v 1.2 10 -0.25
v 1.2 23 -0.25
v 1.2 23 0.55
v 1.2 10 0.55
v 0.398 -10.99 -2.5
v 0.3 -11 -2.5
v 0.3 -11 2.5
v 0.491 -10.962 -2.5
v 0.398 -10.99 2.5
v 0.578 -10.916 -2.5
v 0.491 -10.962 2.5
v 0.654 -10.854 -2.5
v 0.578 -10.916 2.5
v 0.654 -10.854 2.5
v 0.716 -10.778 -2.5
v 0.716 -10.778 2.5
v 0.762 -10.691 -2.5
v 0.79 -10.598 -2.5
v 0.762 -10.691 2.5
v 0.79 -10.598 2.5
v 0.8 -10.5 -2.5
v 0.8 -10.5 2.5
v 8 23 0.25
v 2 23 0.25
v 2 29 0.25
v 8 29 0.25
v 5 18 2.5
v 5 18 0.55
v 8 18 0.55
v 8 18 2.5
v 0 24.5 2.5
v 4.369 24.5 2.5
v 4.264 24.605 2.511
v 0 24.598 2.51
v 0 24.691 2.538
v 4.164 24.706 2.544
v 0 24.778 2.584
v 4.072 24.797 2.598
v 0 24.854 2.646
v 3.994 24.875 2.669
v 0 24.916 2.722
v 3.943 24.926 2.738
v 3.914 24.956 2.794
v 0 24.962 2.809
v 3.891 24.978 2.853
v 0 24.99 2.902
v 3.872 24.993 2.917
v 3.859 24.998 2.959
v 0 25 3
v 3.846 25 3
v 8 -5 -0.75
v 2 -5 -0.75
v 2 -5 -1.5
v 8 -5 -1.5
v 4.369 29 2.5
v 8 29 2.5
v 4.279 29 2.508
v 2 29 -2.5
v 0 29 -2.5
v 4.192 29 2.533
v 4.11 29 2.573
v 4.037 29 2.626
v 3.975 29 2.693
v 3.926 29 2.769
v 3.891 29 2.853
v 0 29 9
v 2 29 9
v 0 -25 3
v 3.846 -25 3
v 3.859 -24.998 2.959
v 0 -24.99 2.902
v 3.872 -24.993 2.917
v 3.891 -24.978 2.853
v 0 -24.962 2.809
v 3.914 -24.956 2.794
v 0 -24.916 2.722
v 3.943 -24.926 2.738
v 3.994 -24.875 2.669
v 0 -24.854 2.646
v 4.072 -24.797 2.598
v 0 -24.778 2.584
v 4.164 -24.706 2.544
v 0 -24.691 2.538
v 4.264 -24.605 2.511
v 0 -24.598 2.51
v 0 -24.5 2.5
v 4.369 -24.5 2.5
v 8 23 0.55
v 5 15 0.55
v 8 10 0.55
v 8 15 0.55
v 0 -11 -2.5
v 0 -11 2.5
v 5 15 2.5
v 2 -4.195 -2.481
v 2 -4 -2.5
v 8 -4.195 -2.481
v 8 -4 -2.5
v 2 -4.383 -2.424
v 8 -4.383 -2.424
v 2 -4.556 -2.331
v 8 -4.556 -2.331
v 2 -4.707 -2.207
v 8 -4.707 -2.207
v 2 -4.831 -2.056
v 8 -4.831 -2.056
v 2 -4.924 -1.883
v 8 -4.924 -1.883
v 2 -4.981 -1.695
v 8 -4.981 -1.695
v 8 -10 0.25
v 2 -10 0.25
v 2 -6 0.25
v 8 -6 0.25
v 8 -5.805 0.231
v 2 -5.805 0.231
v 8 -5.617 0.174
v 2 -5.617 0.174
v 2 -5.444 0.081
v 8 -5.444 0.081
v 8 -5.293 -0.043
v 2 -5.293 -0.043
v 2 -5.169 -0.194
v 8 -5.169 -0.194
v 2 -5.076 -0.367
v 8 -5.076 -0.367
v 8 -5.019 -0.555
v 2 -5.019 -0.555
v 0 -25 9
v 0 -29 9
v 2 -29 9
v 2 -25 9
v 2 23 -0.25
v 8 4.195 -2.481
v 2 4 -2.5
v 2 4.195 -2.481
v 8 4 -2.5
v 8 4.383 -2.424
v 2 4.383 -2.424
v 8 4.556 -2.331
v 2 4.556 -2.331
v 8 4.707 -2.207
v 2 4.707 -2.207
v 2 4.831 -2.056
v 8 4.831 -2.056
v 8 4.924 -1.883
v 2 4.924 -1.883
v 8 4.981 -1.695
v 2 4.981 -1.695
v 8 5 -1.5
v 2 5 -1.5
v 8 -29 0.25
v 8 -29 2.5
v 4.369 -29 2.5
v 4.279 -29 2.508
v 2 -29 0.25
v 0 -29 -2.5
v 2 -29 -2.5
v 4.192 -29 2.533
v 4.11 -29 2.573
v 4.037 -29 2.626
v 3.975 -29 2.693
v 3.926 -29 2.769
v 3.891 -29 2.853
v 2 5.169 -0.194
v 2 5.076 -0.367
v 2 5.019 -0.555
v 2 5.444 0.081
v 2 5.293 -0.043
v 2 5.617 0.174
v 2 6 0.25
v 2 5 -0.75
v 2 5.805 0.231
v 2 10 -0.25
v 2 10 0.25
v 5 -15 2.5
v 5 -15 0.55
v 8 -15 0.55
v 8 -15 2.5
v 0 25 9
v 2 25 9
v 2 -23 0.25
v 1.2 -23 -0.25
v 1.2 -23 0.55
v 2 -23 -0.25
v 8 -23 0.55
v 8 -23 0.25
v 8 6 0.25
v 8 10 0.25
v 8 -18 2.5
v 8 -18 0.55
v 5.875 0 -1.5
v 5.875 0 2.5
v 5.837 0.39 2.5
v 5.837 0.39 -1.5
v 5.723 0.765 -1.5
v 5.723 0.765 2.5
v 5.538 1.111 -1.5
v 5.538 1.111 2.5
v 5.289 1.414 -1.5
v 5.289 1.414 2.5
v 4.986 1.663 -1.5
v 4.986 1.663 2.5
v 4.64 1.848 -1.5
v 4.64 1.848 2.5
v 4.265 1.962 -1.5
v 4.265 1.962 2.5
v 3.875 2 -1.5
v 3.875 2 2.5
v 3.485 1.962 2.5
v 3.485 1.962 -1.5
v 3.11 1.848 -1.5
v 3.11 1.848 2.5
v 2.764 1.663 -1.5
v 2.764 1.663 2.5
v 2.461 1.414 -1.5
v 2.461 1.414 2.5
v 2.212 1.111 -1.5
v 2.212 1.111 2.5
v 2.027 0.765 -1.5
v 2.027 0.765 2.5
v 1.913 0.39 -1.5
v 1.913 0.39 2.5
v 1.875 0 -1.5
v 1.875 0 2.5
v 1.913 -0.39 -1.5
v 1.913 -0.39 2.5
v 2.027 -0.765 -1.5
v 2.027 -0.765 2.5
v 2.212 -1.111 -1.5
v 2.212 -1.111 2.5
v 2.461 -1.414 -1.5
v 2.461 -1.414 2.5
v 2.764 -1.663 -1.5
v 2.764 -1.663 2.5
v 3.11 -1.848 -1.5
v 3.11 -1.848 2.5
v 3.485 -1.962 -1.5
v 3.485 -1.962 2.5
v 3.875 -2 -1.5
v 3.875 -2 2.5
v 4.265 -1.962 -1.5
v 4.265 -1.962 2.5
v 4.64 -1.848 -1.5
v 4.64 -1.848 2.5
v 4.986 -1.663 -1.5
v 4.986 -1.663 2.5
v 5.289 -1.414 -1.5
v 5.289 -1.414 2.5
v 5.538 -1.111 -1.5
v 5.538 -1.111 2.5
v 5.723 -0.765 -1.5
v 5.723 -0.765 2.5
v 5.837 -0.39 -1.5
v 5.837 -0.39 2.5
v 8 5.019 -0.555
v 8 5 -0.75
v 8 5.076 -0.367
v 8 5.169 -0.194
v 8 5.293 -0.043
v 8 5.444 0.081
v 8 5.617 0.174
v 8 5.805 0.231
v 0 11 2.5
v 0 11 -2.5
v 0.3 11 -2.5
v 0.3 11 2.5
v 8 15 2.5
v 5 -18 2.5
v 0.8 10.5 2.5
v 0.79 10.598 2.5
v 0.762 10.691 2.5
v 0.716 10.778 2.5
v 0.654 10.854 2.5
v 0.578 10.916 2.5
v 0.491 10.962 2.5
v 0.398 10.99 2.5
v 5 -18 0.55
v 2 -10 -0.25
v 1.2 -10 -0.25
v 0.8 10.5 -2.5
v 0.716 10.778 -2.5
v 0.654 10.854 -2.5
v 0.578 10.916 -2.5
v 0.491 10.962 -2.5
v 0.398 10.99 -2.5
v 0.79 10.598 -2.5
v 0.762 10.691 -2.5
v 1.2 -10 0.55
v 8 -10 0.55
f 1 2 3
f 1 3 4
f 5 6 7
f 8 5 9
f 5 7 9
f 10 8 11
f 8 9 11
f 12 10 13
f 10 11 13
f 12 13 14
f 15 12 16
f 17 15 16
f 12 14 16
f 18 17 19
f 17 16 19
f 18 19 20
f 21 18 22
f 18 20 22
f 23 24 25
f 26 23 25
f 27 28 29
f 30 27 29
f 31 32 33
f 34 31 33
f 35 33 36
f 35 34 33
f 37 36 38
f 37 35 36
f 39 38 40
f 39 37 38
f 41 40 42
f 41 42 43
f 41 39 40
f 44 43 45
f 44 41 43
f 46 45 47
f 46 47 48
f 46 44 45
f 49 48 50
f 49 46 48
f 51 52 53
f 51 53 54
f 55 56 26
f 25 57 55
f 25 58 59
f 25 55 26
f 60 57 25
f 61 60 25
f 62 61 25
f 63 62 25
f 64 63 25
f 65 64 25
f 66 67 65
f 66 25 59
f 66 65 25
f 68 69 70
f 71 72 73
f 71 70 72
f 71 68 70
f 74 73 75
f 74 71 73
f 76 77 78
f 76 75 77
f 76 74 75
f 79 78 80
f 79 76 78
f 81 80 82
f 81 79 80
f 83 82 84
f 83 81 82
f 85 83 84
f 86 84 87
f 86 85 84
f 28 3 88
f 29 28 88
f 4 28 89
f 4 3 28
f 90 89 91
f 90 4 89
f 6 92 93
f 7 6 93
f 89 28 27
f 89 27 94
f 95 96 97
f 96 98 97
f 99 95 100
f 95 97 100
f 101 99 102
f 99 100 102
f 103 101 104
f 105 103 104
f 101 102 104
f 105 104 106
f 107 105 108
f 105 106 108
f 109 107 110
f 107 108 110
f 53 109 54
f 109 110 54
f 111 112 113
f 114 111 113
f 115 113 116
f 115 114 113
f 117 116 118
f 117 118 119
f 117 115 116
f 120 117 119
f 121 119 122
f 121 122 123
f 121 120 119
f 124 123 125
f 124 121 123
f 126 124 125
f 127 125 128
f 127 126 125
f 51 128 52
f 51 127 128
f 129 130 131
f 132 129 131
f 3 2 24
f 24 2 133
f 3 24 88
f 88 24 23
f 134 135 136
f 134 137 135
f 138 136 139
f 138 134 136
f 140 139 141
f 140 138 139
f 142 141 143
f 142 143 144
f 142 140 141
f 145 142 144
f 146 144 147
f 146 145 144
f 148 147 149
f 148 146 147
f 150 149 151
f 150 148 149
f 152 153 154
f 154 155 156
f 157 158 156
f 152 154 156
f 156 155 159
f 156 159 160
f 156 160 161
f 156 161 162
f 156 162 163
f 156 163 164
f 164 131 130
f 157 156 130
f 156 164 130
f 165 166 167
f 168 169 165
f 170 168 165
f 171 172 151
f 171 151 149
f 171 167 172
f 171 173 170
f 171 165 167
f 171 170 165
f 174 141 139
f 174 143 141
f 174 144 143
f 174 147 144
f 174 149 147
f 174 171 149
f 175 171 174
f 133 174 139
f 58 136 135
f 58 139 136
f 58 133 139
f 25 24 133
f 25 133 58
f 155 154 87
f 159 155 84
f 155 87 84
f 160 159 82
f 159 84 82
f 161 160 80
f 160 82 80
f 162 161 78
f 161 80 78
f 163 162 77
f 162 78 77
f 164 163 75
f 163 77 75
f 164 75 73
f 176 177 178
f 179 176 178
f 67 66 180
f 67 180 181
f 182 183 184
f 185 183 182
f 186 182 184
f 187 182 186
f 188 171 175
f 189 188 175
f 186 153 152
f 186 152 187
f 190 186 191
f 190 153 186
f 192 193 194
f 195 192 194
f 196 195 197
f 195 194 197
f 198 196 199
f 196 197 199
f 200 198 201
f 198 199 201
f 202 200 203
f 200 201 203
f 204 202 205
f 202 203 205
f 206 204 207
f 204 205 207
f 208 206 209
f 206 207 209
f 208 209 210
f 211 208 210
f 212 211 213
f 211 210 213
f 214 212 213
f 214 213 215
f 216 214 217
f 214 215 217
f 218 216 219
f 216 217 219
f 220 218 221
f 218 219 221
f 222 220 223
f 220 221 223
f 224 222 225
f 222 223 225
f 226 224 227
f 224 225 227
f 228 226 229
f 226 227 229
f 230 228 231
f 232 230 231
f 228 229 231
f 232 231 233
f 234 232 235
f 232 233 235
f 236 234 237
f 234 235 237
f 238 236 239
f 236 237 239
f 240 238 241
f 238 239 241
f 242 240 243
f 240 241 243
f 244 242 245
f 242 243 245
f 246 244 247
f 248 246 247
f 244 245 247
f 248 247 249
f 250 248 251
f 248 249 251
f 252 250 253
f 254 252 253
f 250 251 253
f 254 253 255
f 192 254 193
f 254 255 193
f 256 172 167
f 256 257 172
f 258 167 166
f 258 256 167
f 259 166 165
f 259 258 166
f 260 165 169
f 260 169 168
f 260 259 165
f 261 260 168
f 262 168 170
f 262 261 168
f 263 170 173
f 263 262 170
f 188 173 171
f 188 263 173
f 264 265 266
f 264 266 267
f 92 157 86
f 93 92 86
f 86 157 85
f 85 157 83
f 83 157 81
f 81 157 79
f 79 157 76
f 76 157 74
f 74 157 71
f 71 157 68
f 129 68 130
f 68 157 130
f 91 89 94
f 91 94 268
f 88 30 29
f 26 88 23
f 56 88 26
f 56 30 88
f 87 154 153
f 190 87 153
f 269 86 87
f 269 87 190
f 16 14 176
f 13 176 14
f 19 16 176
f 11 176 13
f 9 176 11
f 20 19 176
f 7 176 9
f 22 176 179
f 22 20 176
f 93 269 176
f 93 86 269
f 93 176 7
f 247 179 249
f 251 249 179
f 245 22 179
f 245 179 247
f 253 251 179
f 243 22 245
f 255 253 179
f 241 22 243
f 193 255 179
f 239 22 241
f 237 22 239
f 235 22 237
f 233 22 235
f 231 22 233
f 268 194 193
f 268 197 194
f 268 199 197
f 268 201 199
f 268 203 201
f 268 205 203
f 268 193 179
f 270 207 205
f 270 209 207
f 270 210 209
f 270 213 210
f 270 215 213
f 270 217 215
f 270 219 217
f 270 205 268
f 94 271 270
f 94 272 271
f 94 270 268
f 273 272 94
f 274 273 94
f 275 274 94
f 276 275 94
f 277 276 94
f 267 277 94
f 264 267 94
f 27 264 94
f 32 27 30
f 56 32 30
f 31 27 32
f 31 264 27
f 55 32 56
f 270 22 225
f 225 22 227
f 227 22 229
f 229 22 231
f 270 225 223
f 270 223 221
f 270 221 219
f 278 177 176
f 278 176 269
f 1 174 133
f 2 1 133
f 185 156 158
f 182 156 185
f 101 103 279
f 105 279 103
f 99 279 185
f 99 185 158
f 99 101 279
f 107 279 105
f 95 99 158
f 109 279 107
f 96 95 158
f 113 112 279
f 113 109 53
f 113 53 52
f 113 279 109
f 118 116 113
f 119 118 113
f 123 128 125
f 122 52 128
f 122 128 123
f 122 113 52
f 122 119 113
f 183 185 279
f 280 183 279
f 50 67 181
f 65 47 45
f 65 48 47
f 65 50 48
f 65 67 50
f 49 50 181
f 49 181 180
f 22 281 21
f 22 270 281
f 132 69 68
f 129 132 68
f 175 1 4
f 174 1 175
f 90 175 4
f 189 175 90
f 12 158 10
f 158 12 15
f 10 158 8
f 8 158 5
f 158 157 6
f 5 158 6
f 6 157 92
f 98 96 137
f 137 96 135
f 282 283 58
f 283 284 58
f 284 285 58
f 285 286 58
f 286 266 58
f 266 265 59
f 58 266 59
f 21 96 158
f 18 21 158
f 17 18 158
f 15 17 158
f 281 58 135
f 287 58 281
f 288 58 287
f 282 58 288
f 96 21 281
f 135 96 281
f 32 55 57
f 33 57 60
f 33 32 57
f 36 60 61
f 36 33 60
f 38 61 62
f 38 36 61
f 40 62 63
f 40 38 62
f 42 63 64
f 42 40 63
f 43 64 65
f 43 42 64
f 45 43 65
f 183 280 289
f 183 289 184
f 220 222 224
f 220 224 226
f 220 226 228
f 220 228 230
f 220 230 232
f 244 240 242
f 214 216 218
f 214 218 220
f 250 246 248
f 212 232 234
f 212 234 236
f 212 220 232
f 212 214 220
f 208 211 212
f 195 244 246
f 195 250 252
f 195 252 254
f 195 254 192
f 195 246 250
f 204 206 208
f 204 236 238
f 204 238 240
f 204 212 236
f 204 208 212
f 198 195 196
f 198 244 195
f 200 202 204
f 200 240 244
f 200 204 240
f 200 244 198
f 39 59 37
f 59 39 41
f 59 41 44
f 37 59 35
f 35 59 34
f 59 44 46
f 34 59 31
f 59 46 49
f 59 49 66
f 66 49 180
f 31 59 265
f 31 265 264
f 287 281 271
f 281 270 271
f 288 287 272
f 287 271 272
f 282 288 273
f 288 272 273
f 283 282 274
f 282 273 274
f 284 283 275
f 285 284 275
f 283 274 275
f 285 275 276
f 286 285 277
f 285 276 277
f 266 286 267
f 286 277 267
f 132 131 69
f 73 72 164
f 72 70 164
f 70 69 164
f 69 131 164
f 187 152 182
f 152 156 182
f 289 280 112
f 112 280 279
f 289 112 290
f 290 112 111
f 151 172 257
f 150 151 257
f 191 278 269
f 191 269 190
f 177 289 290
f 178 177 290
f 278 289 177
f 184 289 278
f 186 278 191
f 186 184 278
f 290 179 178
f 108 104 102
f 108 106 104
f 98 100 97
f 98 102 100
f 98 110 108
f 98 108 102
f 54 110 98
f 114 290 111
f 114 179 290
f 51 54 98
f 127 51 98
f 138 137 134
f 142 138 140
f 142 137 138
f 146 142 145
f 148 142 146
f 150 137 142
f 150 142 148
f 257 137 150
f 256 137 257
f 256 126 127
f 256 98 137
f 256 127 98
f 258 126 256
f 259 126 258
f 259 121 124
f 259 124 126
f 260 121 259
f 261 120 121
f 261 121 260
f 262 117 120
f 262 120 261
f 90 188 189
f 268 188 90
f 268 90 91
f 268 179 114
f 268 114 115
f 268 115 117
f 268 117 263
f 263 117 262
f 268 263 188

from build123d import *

# Parameters (mm, degrees)
F0_W      = 58
F0_H      = 5
F1_DEPTH  = 2
F2_W      = 13
F2_H      = 0.5
F3_DEPTH  = 0.8
F4_W      = 58
F4_H      = 2.25
F5_DEPTH  = 6
F6_W      = 6
F6_H      = 10
F7_DEPTH  = 2.75
F8_R      = 2
F9_DEPTH  = 4
F10_R     = 1
F12_DEPTH = 4
F13_W     = 22
F13_H     = 5
F14_DEPTH = 0.8
F15_R     = 0.5
F16_W     = 6.8
F16_H     = 13
F17_DEPTH = 0.3
F18_W     = 3
F18_H     = 3
F19_DEPTH = 1.95


# Not quite as in the source:
# - a pattern or mirror of a feature is missing from the dataset's text; its kind, count and spacing are read off the source's solid


with BuildPart() as f1:
    # F0 (on Right) → F1 (new body)
    with BuildSketch(Plane.YZ):
        Rectangle(F0_W, F0_H)
    extrude(amount=F1_DEPTH)

    # F2 (on face) → F3 (cut)
    with BuildSketch(Plane.YZ.offset(2)):
        with Locations((16.5, 0)):
            Rectangle(F2_W, F2_H)
        with Locations((-16.5, 0)):
            Rectangle(F2_W, F2_H)
    extrude(amount=-F3_DEPTH, mode=Mode.SUBTRACT)

    # F4 (on face) → F5 (join)
    with BuildSketch(Plane.YZ.offset(2)):
        with Locations((0, 1.375)):
            Rectangle(F4_W, F4_H)
    extrude(amount=F5_DEPTH)

    # F6 (on face) → F7 (join, through all)
    with BuildSketch(Plane(origin=(0, 0, 0.25), x_dir=(1, 0, 0), z_dir=(0, 0, -1))):
        with Locations((5, 0)):
            Rectangle(F6_W, F6_H)
    extrude(amount=F7_DEPTH)

    # F8 (on face) → F9 (cut)
    with BuildSketch(Plane.XY.offset(2.5)):
        with Locations((3.875, 0)):
            Circle(F8_R)
    extrude(amount=-F9_DEPTH, mode=Mode.SUBTRACT)

    # F10
    f10_edges = [f1.edges().sort_by_distance(p)[0] for p in [
        (5, -5, -2.5),
        (5, -5, 0.25),
        (5, 5, 0.25),
        (5, 5, -2.5),
    ]]
    fillet(f10_edges, radius=F10_R)

    # F11 (on face) → F12 (join)
    with BuildSketch(Plane(origin=(0, 29, 0), x_dir=(-1, 0, 0), z_dir=(0, 1, 0))):
        Polygon((-4, 2.5), (0, 2.5), (0, 9), (-2, 9), align=None)
    f12 = extrude(amount=-F12_DEPTH)

    # F12_copies: F12 across plane
    add(f12.mirror(Plane(origin=(0, 0, 0), x_dir=(0, 0, -1), z_dir=(0, -1, 0))))

    # F13 (on face) → F14 (cut)
    with BuildSketch(Plane(origin=(0, 0, 0), x_dir=(0, -1, 0), z_dir=(-1, 0, 0))):
        Rectangle(F13_W, F13_H)
    extrude(amount=-F14_DEPTH, mode=Mode.SUBTRACT)

    # F15
    f15_edges = [f1.edges().sort_by_distance(p)[0] for p in [
        (0.8, 11, 0),
        (0.8, -11, 0),
        (4, 27, 2.5),
        (2, 25, 2.5),
        (2, -25, 2.5),
        (4, -27, 2.5),
    ]]
    fillet(f15_edges, radius=F15_R)

    # F16 (on face) → F17 (cut)
    with BuildSketch(Plane(origin=(0, 0, 0.25), x_dir=(1, 0, 0), z_dir=(0, 0, -1))):
        with Locations((4.6, 16.5)):
            Rectangle(F16_W, F16_H)
        with Locations((4.6, -16.5)):
            Rectangle(F16_W, F16_H)
    extrude(amount=-F17_DEPTH, mode=Mode.SUBTRACT)

    # F18 (on face) → F19 (cut, through all)
    with BuildSketch(Plane(origin=(0, 0, 0.55), x_dir=(1, 0, 0), z_dir=(0, 0, -1))):
        with Locations((6.5, -16.5)):
            Rectangle(F18_W, F18_H)
        with Locations((6.5, 16.5)):
            Rectangle(F18_W, F18_H)
    extrude(amount=-F19_DEPTH, mode=Mode.SUBTRACT)


solid = f1.part
